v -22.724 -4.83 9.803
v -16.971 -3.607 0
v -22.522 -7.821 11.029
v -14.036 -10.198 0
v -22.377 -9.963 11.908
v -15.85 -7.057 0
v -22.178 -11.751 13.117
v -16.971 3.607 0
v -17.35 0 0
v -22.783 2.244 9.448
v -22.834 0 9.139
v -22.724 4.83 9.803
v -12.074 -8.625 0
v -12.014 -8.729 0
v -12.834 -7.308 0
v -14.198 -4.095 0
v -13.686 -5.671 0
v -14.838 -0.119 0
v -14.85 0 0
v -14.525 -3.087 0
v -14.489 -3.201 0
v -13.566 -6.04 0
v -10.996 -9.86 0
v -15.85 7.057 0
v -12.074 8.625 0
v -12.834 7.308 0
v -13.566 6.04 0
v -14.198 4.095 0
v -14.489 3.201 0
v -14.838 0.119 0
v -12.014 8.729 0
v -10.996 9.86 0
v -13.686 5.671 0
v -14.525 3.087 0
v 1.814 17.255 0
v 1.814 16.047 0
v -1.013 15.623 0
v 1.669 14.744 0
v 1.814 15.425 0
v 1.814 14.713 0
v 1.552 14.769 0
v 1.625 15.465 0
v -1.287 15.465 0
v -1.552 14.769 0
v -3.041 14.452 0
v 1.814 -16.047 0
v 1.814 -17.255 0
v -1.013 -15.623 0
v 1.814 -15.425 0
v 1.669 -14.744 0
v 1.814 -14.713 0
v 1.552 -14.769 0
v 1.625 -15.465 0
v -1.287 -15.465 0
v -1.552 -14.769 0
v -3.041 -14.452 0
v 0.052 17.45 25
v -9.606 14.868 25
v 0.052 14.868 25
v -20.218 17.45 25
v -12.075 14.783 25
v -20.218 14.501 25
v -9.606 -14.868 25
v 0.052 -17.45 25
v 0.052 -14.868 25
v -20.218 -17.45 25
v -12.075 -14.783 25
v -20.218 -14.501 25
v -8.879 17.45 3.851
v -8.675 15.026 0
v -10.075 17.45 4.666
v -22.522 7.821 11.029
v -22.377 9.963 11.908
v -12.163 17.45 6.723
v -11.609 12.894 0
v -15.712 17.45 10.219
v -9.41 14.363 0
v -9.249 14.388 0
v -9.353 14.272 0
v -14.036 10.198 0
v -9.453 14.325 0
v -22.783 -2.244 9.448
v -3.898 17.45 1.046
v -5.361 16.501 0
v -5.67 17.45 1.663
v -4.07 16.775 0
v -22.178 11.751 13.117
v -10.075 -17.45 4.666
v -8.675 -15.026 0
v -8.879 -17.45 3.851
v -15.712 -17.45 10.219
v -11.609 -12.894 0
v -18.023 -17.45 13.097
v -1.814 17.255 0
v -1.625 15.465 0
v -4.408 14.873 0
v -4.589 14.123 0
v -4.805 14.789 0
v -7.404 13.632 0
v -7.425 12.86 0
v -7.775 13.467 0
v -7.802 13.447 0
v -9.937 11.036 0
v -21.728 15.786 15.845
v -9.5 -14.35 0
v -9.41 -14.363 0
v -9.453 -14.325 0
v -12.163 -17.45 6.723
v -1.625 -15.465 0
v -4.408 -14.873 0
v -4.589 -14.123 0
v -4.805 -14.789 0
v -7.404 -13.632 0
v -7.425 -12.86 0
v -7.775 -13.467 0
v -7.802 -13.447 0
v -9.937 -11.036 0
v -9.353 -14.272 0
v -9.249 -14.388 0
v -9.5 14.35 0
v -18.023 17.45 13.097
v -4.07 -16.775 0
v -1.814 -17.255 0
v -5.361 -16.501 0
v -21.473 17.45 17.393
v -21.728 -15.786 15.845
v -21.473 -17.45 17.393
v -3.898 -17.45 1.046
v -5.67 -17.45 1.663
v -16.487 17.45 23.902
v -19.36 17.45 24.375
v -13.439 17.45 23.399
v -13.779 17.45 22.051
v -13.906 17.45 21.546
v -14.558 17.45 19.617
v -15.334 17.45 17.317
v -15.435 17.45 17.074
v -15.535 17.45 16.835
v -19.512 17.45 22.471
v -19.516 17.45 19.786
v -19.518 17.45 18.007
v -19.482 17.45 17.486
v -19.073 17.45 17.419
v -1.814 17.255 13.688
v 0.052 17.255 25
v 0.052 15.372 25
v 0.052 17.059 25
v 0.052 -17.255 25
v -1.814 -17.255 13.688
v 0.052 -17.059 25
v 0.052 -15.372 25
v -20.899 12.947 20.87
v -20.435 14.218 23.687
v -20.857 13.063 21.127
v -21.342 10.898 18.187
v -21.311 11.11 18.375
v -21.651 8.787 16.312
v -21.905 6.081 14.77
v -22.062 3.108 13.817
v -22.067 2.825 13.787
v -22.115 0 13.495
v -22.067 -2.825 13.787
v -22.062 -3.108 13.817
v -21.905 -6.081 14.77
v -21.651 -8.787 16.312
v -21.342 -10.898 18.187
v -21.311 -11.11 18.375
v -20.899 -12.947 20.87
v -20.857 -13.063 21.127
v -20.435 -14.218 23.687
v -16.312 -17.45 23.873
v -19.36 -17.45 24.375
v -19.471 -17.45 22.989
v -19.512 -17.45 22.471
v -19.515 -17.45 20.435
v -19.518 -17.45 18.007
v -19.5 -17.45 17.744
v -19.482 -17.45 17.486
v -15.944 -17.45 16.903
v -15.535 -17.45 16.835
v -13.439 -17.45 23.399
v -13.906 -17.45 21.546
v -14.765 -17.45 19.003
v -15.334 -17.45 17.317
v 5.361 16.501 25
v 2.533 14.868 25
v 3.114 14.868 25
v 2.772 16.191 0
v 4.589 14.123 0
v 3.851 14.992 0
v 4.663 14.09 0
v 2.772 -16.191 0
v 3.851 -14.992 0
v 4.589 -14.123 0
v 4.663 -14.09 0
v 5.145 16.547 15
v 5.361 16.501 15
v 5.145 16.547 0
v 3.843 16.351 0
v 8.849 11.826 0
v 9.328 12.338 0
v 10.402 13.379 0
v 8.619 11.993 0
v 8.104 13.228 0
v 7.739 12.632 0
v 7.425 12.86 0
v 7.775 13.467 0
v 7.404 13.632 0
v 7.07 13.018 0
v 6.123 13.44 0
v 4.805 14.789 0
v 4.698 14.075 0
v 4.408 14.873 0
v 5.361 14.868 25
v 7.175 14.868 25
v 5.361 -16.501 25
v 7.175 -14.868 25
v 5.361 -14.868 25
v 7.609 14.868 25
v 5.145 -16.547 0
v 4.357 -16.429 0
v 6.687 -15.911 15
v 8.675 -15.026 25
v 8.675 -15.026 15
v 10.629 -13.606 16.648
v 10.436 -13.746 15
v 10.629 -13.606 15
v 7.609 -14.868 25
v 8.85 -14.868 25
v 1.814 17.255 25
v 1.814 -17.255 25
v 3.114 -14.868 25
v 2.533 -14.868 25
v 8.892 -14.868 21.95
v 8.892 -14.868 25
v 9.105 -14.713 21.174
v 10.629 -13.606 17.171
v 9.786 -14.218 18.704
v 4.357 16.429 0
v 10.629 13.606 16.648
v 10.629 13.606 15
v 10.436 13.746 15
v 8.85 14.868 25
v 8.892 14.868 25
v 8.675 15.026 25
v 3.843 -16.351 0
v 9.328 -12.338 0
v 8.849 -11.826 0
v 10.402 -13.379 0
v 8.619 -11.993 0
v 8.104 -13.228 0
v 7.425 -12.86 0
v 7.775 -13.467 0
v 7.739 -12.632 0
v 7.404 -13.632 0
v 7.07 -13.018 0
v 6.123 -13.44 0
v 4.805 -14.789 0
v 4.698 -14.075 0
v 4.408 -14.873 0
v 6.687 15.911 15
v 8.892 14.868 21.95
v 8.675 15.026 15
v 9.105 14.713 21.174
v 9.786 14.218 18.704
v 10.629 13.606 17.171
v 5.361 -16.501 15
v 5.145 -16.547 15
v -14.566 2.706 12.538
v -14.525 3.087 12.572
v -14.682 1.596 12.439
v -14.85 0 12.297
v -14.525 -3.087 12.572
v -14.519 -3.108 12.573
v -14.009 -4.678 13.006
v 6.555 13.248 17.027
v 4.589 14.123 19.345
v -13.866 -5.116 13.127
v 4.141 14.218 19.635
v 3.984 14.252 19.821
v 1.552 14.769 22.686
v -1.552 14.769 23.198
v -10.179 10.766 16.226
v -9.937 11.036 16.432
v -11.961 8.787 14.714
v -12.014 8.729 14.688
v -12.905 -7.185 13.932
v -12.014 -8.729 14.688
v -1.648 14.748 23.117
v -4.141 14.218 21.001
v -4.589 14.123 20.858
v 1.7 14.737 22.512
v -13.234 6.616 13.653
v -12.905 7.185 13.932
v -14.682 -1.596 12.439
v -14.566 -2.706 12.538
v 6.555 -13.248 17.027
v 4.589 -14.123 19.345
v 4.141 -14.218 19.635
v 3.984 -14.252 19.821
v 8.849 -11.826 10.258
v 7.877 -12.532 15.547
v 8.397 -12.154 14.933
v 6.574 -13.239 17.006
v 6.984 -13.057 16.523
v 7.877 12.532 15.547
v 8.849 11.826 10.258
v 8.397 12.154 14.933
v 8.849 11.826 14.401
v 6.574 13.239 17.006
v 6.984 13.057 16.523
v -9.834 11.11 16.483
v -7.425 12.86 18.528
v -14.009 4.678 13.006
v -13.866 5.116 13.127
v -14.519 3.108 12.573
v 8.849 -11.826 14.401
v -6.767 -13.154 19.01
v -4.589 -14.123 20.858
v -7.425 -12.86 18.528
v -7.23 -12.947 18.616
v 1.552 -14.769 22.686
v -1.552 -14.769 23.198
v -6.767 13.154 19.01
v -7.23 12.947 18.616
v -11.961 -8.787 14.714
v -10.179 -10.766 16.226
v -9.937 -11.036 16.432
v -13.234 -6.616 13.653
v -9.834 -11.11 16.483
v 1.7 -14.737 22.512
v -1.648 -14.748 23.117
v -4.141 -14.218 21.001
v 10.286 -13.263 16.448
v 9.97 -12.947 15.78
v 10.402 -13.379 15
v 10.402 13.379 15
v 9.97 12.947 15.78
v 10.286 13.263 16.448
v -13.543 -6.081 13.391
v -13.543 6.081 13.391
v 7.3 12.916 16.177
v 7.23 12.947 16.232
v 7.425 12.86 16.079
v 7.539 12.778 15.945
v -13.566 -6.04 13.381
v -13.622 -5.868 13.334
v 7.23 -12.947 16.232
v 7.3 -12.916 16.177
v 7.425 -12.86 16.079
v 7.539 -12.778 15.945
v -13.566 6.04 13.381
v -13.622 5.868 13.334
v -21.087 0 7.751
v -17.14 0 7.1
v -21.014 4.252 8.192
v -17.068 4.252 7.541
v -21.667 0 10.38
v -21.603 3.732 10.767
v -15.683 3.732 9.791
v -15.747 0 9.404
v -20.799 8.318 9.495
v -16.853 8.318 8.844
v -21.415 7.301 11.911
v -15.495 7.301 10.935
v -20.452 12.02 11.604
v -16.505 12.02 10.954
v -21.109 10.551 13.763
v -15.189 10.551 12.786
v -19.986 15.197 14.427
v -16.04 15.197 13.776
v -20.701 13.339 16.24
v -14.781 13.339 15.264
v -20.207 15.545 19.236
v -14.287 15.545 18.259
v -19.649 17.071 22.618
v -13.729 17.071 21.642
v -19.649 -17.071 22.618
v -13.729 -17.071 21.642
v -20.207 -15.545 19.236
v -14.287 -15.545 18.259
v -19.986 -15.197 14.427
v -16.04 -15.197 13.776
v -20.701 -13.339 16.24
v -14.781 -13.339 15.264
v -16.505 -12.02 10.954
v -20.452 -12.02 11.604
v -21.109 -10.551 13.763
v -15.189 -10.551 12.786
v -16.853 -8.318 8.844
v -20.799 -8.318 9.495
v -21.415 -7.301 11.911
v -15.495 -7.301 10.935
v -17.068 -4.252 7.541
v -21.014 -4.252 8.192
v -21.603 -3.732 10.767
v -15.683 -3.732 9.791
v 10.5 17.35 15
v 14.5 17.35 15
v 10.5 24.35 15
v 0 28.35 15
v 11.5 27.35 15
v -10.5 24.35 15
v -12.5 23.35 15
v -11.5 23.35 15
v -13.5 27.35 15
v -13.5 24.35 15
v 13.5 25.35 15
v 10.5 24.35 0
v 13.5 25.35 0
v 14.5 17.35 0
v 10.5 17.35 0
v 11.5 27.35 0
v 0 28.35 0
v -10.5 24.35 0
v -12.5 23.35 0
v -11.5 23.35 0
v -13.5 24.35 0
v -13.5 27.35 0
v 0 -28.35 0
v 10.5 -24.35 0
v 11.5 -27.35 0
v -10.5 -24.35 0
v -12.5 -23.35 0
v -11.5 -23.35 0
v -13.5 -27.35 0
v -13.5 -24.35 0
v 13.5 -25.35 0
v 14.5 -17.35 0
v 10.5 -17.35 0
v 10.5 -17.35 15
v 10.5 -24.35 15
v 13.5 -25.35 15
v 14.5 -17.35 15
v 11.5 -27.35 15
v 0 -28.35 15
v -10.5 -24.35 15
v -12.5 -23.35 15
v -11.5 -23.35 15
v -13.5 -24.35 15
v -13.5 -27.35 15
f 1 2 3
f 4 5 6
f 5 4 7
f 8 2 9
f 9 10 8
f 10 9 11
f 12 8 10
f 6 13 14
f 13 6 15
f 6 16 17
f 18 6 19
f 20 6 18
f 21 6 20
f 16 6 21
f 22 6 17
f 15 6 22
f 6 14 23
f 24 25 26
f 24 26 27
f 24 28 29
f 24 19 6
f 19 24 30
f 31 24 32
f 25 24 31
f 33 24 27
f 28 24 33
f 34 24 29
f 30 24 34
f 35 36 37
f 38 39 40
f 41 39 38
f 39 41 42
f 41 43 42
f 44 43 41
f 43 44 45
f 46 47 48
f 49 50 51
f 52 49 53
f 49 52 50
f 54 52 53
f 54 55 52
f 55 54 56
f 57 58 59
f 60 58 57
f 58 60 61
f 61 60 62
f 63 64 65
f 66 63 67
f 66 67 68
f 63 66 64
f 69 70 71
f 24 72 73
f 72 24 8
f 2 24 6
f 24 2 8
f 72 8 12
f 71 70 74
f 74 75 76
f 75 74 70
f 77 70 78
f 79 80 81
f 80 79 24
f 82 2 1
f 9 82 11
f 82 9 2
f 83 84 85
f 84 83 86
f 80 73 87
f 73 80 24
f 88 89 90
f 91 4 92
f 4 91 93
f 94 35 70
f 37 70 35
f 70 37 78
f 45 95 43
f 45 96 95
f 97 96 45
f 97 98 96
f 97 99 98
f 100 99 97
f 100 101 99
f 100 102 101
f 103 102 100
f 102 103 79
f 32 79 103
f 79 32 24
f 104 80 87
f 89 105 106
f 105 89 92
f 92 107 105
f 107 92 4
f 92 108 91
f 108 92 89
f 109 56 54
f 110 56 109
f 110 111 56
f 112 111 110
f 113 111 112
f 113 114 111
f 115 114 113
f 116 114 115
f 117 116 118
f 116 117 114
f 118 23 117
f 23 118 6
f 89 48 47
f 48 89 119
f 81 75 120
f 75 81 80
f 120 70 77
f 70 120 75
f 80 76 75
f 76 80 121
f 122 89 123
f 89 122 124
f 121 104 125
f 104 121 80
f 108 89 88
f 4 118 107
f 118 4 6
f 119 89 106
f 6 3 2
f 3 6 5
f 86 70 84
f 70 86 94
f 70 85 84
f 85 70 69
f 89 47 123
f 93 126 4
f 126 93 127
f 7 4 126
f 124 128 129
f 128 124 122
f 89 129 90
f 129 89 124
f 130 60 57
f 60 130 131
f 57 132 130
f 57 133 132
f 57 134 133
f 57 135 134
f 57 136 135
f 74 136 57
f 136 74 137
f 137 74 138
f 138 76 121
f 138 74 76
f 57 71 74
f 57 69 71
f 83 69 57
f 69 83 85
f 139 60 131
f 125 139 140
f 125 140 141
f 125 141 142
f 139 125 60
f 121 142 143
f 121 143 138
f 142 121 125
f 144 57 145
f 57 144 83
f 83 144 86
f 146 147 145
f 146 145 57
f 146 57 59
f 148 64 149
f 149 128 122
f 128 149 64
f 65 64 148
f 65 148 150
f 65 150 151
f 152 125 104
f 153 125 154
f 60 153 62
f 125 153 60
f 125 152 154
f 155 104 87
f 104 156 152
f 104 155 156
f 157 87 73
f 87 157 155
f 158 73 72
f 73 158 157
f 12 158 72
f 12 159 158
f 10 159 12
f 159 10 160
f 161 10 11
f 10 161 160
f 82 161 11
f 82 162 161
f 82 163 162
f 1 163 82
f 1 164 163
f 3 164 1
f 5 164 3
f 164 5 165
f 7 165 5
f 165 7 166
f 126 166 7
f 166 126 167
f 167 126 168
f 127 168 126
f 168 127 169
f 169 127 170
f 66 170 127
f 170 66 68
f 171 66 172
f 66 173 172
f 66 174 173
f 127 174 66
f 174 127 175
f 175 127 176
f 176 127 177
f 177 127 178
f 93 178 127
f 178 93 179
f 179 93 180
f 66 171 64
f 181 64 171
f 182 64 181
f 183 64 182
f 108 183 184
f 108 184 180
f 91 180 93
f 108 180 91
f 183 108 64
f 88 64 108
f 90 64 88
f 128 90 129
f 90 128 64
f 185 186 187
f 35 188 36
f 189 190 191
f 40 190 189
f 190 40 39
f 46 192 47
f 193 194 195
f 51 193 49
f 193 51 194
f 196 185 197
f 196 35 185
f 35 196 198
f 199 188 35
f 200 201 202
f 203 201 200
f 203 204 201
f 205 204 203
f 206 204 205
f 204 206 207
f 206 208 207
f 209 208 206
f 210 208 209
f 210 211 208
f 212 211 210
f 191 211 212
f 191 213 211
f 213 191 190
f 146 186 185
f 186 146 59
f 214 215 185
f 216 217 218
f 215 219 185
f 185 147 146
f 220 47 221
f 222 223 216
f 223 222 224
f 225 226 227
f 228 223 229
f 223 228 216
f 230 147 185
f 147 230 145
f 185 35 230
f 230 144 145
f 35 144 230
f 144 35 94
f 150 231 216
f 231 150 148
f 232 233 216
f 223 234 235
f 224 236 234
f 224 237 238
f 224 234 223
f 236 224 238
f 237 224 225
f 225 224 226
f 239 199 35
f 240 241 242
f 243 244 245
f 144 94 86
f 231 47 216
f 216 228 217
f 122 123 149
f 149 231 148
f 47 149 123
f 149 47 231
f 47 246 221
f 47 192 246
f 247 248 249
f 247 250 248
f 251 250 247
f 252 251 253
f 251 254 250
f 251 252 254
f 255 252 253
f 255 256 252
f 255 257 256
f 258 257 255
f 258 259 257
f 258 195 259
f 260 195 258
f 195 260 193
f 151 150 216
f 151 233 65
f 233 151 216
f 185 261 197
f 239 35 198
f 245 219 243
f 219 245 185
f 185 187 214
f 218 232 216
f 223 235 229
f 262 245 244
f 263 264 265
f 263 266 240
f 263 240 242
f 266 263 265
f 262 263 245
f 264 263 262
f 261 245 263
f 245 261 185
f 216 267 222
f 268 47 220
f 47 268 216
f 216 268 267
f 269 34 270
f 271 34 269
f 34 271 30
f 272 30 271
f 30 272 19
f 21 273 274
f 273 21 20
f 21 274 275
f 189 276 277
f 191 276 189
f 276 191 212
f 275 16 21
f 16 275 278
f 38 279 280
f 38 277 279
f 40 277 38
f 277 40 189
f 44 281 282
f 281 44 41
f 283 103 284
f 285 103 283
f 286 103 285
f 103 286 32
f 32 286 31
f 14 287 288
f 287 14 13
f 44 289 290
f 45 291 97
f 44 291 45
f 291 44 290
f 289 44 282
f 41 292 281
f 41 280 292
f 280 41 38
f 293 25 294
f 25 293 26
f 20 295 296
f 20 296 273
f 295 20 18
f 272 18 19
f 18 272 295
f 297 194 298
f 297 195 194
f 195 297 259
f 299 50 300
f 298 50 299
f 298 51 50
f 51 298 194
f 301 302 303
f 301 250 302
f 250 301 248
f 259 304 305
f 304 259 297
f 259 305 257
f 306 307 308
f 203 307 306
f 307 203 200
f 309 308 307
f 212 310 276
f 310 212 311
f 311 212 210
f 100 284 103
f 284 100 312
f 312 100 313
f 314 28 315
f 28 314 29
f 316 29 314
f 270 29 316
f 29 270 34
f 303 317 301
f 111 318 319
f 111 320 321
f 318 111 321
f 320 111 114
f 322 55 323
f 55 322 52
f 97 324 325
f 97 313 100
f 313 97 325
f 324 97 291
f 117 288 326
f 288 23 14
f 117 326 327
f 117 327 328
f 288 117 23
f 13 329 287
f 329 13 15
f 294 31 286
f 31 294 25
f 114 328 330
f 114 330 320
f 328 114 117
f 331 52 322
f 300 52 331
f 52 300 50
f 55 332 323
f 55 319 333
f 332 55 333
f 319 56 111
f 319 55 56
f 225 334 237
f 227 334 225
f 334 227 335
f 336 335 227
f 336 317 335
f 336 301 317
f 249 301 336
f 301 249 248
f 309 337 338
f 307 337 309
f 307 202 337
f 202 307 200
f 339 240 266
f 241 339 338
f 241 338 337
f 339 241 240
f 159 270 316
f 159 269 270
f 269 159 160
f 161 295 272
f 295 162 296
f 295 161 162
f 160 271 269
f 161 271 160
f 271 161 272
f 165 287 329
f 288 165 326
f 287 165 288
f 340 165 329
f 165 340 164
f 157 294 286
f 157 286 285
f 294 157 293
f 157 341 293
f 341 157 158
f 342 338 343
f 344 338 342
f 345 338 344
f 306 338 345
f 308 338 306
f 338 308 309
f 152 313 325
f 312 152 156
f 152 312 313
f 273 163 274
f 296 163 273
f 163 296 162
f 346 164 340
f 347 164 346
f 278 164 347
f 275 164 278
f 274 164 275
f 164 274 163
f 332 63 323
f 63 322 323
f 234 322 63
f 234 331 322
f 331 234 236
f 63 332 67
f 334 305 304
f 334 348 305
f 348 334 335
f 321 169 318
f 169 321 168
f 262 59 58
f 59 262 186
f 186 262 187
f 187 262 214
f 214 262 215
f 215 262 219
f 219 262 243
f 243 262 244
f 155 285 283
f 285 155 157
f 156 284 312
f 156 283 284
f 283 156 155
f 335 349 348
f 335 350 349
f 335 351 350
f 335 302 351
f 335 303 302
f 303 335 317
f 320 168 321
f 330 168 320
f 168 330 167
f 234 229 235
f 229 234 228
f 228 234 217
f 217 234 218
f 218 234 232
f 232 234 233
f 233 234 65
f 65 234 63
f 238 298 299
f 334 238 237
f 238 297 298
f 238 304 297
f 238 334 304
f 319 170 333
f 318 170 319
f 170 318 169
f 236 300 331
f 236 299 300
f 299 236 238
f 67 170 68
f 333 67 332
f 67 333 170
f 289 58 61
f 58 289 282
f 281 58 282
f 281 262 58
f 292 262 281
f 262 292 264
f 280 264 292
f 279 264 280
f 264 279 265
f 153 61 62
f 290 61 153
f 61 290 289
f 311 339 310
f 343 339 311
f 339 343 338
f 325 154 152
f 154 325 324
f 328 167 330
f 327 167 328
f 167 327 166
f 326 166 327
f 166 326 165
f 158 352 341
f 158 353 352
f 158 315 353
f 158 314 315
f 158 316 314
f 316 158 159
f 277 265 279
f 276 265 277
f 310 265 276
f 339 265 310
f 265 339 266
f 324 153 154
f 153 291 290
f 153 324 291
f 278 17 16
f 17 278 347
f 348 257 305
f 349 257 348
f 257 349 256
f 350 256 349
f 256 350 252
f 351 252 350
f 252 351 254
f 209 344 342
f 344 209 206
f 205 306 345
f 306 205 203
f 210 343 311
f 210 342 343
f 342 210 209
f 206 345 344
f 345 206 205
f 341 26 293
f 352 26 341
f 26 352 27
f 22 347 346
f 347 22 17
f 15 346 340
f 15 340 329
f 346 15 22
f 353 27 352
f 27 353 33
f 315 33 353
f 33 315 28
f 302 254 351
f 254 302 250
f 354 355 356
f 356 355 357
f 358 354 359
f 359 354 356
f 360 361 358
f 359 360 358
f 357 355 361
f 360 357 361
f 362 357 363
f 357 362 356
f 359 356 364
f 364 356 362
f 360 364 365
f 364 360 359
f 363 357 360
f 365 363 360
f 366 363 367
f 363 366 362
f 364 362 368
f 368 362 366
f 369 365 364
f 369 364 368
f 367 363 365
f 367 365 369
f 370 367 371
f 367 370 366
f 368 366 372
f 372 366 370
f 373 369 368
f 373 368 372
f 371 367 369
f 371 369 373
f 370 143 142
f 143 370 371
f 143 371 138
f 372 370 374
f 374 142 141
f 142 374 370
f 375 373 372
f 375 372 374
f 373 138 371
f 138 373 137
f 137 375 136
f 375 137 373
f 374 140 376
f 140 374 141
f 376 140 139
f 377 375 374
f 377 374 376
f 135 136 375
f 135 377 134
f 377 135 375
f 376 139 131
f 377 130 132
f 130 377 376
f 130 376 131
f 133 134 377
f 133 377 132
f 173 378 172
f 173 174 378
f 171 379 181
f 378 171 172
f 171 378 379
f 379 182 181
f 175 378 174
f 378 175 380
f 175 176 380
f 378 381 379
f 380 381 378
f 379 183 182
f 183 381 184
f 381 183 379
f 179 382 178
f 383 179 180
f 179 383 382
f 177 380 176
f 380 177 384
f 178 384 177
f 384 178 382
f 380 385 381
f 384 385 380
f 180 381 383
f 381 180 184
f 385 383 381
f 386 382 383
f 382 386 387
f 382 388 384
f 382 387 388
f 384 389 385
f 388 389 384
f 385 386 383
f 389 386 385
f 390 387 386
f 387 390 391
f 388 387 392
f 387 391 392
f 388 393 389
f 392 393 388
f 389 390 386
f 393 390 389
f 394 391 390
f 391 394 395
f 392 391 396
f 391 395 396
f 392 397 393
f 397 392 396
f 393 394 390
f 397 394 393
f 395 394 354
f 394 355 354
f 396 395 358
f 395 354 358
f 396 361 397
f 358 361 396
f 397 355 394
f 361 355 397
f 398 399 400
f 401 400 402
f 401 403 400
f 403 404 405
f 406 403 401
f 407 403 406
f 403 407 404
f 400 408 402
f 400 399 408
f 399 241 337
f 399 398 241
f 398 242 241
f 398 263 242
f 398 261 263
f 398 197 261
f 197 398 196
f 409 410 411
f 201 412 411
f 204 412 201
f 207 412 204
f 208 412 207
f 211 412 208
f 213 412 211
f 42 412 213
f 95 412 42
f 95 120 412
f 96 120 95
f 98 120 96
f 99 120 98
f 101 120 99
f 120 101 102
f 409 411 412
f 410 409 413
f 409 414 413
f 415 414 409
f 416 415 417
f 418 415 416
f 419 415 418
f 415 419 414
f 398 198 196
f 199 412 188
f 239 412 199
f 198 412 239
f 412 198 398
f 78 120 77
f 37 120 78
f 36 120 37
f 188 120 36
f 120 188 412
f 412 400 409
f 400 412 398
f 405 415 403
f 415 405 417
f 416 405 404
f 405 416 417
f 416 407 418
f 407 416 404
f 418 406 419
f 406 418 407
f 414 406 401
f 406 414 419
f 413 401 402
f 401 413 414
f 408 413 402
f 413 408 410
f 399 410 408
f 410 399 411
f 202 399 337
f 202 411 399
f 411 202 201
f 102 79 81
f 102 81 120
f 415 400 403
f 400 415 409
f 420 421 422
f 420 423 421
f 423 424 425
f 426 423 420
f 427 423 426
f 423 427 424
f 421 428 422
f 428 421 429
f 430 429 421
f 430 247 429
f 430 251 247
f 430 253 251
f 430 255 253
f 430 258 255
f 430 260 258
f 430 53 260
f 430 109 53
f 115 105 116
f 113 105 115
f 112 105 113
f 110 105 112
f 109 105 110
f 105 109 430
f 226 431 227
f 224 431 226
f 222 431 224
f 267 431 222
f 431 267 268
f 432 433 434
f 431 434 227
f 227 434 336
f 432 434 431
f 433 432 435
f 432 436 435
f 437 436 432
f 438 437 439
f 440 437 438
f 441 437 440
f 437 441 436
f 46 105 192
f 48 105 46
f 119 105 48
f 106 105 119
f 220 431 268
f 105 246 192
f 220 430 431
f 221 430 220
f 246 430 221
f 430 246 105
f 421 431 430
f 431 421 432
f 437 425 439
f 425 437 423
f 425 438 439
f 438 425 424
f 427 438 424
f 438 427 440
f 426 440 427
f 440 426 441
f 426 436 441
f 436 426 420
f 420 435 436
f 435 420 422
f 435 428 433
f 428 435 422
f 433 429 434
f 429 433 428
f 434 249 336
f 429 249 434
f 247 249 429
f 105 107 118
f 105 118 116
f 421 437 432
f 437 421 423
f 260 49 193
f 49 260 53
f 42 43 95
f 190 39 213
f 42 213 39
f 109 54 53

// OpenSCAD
// [FL_INDEX: keywords="openscad, 3d_parametric, TiGr_Lock_Bike_Mount, csg_solid" | COT="Parametric OpenSCAD design from 3DCodeverse"]
// Title: TiGr Lock Bike Mount 

seat_tube_diameter = 28.9;
top_tube_diameter = 28.7;
seat_tube_angle = 74;

seat_stay_diameter = 19.1;

inflateMM = 0.5; // allow room for a piece of inner tube under the clip

seat_staytube_triangle_lengths = [
	125, // seat stay
	85, // seat tube
	107, // distance from st point to ss point
];

seat_stay_triangle_lengths = [
	120, // seat stay
	120, // seat stay
	59, // distance from ss point to ss point
];

translate([0,0,25]) rotate([0,-90,0]) tigrMount();

module tigrMount() {
	difference() {
	rotate([0, 270-ttRotate()[1], 0]) {
		difference() {
			union() {
				ttClip(25);
				// stClip(25, 4);
			}
			#seat_assembly(inflateBy = inflateMM);
			zipCutout( seat_tube_diameter/2+3+inflateMM, stRotate()[1]+90, -16);
		}
	}
		translate([-50,-50,-100 - top_tube_diameter*0.4]) cube([100,100,100]);
	}

	difference() {
		translate([-10,0,0]) union() {
			tigrCatch2(3, 15);
			tigrCatch2(3, 15, true);
		}
		rotate([0, 270-ttRotate()[1], 0]) seat_assembly(inflateBy = inflateMM+0.7);
	}
}
module zipCutout(r, angle, z) {
	wid = 2.5;
	rotate([0, 90+angle, 0])
	translate([0,0,-z])
	rotate_extrude() polygon([
		[r, 3],
		[r+wid, 2],
		[r+wid, -2],
		[r, -3],
		]);
	// rotate_extrude() translate([r+wid/2,0,0]) square(size=[ wid, 6], center=true);
}

module tigrCatch2(offset = 3, length = 8, zflip = false) {
	tigrZ = 21;
	tigry = top_tube_diameter/2+offset;
	tigrx = 7;
	zrot = zflip ? 180 : 0;
	difference() {
		translate([zflip ? -length : 0, 0, 0])
		rotate([0,-90,zrot])
		linear_extrude(height=length) 
			polygon([
				[-4,top_tube_diameter/4],
				// [-tigrZ/2 - 3, tigry - offset],
				[-tigrZ/2 - 4, tigry],
				[-tigrZ/2 - 3, tigry + tigrx + 1],
				[-tigrZ/2 - 1, tigry + tigrx + 3],
				[0, tigry + tigrx + 4],
				[tigrZ/2 + 3, tigry + tigrx + 3],
				[tigrZ/2 + 3, tigry + tigrx + 0],
				[tigrZ/2 + 2, tigry + tigrx - 1],
				[tigrZ/2 + 1, tigry + tigrx - 1],
				[tigrZ/2 + 0, tigry + tigrx ],
				[-tigrZ/2 + 0, tigry + tigrx ],
				[-tigrZ/2 + 0, tigry ],
				[tigrZ/2-1, tigry - offset],
				]);
		rotate([0,0,zrot]) translate([0,tigry + tigrx/2,0]) cube(size=[100, tigrx, tigrZ], center=true);
	}
	
}


module ttClip(len=30, zip = true) {
	difference() {
		union() {
			top_tube(len, 3, offset = 0);
			if (zip) {
				intersection() {
					rotate(ttRotate()) 
						cylinder(
							r1=top_tube_diameter/2 + 18, 
							r2=top_tube_diameter/2 + 3, 
							h=len, center=false);
					translate([0,0,top_tube_diameter/2-4]) rotate(stRotate()) 
						cube(size=[100, seat_tube_diameter+6, 20], center=true);
				}
	
			}
		}
		top_tube(len+1, inflateMM, offset = 0);
		translate([-len/2,0,-top_tube_diameter * 0.465]) 
			rotate(ttRotate()) 
				rotate([45,90,0]) 
					cube(size=[len*5, len, len], center=true);
	}
}

module seat_assembly(inflateBy = 0) {
	seat_tube(inflateBy = inflateBy);
	seat_stay(inflateBy = inflateBy);
	seat_stay(-1, inflateBy = inflateBy);	
	top_tube(inflateBy = inflateBy);
}

module top_tube(len=200, inflateBy = 0, offset = 0) {
	rotate(ttRotate()) 
		rawTT(len, inflateBy, offset);
}

module seat_tube(len=200, inflateBy = 0) {
	rotate(stRotate()) 
		rawST(zTranslate = -seat_stay_diameter*2, inflateBy = inflateBy);		
}

module rawST(len=200, zTranslate = 0, inflateBy = 0) {
	translate([0,0,zTranslate])
		cylinder(r=seat_tube_diameter/2 + inflateBy, h=len, center=false);			
}
module rawTT(len=200, inflateBy = 0, offset = 0) {
	translate([0,0,offset])
		cylinder(r=top_tube_diameter/2 + inflateBy, h=len, center=false);			
}

function stRotate() = [0,270-seat_tube_angle,0];
function ttRotate() = [0,270-seat_tube_angle+ atan( 60.65 / 10),0];

module seat_stay(direction=1, len=200, inflateBy = 0) {
	rotate([
		direction * seat_stay_angle(seat_stay_triangle_lengths)/2,
		270-(seat_stay_angle(seat_staytube_triangle_lengths)+seat_tube_angle),
		0
	]) {
		cylinder(r=seat_stay_diameter/2 + inflateBy, h=len, center=false);		
	}
}

function sqr(val) = val*val;

function seat_stay_angle(triangle) = acos(
	(
		sqr(triangle[0]) + 
		sqr(triangle[1]) -
		sqr(triangle[2])
	) / (
		2 * triangle[0] * triangle[1]
	)
);
